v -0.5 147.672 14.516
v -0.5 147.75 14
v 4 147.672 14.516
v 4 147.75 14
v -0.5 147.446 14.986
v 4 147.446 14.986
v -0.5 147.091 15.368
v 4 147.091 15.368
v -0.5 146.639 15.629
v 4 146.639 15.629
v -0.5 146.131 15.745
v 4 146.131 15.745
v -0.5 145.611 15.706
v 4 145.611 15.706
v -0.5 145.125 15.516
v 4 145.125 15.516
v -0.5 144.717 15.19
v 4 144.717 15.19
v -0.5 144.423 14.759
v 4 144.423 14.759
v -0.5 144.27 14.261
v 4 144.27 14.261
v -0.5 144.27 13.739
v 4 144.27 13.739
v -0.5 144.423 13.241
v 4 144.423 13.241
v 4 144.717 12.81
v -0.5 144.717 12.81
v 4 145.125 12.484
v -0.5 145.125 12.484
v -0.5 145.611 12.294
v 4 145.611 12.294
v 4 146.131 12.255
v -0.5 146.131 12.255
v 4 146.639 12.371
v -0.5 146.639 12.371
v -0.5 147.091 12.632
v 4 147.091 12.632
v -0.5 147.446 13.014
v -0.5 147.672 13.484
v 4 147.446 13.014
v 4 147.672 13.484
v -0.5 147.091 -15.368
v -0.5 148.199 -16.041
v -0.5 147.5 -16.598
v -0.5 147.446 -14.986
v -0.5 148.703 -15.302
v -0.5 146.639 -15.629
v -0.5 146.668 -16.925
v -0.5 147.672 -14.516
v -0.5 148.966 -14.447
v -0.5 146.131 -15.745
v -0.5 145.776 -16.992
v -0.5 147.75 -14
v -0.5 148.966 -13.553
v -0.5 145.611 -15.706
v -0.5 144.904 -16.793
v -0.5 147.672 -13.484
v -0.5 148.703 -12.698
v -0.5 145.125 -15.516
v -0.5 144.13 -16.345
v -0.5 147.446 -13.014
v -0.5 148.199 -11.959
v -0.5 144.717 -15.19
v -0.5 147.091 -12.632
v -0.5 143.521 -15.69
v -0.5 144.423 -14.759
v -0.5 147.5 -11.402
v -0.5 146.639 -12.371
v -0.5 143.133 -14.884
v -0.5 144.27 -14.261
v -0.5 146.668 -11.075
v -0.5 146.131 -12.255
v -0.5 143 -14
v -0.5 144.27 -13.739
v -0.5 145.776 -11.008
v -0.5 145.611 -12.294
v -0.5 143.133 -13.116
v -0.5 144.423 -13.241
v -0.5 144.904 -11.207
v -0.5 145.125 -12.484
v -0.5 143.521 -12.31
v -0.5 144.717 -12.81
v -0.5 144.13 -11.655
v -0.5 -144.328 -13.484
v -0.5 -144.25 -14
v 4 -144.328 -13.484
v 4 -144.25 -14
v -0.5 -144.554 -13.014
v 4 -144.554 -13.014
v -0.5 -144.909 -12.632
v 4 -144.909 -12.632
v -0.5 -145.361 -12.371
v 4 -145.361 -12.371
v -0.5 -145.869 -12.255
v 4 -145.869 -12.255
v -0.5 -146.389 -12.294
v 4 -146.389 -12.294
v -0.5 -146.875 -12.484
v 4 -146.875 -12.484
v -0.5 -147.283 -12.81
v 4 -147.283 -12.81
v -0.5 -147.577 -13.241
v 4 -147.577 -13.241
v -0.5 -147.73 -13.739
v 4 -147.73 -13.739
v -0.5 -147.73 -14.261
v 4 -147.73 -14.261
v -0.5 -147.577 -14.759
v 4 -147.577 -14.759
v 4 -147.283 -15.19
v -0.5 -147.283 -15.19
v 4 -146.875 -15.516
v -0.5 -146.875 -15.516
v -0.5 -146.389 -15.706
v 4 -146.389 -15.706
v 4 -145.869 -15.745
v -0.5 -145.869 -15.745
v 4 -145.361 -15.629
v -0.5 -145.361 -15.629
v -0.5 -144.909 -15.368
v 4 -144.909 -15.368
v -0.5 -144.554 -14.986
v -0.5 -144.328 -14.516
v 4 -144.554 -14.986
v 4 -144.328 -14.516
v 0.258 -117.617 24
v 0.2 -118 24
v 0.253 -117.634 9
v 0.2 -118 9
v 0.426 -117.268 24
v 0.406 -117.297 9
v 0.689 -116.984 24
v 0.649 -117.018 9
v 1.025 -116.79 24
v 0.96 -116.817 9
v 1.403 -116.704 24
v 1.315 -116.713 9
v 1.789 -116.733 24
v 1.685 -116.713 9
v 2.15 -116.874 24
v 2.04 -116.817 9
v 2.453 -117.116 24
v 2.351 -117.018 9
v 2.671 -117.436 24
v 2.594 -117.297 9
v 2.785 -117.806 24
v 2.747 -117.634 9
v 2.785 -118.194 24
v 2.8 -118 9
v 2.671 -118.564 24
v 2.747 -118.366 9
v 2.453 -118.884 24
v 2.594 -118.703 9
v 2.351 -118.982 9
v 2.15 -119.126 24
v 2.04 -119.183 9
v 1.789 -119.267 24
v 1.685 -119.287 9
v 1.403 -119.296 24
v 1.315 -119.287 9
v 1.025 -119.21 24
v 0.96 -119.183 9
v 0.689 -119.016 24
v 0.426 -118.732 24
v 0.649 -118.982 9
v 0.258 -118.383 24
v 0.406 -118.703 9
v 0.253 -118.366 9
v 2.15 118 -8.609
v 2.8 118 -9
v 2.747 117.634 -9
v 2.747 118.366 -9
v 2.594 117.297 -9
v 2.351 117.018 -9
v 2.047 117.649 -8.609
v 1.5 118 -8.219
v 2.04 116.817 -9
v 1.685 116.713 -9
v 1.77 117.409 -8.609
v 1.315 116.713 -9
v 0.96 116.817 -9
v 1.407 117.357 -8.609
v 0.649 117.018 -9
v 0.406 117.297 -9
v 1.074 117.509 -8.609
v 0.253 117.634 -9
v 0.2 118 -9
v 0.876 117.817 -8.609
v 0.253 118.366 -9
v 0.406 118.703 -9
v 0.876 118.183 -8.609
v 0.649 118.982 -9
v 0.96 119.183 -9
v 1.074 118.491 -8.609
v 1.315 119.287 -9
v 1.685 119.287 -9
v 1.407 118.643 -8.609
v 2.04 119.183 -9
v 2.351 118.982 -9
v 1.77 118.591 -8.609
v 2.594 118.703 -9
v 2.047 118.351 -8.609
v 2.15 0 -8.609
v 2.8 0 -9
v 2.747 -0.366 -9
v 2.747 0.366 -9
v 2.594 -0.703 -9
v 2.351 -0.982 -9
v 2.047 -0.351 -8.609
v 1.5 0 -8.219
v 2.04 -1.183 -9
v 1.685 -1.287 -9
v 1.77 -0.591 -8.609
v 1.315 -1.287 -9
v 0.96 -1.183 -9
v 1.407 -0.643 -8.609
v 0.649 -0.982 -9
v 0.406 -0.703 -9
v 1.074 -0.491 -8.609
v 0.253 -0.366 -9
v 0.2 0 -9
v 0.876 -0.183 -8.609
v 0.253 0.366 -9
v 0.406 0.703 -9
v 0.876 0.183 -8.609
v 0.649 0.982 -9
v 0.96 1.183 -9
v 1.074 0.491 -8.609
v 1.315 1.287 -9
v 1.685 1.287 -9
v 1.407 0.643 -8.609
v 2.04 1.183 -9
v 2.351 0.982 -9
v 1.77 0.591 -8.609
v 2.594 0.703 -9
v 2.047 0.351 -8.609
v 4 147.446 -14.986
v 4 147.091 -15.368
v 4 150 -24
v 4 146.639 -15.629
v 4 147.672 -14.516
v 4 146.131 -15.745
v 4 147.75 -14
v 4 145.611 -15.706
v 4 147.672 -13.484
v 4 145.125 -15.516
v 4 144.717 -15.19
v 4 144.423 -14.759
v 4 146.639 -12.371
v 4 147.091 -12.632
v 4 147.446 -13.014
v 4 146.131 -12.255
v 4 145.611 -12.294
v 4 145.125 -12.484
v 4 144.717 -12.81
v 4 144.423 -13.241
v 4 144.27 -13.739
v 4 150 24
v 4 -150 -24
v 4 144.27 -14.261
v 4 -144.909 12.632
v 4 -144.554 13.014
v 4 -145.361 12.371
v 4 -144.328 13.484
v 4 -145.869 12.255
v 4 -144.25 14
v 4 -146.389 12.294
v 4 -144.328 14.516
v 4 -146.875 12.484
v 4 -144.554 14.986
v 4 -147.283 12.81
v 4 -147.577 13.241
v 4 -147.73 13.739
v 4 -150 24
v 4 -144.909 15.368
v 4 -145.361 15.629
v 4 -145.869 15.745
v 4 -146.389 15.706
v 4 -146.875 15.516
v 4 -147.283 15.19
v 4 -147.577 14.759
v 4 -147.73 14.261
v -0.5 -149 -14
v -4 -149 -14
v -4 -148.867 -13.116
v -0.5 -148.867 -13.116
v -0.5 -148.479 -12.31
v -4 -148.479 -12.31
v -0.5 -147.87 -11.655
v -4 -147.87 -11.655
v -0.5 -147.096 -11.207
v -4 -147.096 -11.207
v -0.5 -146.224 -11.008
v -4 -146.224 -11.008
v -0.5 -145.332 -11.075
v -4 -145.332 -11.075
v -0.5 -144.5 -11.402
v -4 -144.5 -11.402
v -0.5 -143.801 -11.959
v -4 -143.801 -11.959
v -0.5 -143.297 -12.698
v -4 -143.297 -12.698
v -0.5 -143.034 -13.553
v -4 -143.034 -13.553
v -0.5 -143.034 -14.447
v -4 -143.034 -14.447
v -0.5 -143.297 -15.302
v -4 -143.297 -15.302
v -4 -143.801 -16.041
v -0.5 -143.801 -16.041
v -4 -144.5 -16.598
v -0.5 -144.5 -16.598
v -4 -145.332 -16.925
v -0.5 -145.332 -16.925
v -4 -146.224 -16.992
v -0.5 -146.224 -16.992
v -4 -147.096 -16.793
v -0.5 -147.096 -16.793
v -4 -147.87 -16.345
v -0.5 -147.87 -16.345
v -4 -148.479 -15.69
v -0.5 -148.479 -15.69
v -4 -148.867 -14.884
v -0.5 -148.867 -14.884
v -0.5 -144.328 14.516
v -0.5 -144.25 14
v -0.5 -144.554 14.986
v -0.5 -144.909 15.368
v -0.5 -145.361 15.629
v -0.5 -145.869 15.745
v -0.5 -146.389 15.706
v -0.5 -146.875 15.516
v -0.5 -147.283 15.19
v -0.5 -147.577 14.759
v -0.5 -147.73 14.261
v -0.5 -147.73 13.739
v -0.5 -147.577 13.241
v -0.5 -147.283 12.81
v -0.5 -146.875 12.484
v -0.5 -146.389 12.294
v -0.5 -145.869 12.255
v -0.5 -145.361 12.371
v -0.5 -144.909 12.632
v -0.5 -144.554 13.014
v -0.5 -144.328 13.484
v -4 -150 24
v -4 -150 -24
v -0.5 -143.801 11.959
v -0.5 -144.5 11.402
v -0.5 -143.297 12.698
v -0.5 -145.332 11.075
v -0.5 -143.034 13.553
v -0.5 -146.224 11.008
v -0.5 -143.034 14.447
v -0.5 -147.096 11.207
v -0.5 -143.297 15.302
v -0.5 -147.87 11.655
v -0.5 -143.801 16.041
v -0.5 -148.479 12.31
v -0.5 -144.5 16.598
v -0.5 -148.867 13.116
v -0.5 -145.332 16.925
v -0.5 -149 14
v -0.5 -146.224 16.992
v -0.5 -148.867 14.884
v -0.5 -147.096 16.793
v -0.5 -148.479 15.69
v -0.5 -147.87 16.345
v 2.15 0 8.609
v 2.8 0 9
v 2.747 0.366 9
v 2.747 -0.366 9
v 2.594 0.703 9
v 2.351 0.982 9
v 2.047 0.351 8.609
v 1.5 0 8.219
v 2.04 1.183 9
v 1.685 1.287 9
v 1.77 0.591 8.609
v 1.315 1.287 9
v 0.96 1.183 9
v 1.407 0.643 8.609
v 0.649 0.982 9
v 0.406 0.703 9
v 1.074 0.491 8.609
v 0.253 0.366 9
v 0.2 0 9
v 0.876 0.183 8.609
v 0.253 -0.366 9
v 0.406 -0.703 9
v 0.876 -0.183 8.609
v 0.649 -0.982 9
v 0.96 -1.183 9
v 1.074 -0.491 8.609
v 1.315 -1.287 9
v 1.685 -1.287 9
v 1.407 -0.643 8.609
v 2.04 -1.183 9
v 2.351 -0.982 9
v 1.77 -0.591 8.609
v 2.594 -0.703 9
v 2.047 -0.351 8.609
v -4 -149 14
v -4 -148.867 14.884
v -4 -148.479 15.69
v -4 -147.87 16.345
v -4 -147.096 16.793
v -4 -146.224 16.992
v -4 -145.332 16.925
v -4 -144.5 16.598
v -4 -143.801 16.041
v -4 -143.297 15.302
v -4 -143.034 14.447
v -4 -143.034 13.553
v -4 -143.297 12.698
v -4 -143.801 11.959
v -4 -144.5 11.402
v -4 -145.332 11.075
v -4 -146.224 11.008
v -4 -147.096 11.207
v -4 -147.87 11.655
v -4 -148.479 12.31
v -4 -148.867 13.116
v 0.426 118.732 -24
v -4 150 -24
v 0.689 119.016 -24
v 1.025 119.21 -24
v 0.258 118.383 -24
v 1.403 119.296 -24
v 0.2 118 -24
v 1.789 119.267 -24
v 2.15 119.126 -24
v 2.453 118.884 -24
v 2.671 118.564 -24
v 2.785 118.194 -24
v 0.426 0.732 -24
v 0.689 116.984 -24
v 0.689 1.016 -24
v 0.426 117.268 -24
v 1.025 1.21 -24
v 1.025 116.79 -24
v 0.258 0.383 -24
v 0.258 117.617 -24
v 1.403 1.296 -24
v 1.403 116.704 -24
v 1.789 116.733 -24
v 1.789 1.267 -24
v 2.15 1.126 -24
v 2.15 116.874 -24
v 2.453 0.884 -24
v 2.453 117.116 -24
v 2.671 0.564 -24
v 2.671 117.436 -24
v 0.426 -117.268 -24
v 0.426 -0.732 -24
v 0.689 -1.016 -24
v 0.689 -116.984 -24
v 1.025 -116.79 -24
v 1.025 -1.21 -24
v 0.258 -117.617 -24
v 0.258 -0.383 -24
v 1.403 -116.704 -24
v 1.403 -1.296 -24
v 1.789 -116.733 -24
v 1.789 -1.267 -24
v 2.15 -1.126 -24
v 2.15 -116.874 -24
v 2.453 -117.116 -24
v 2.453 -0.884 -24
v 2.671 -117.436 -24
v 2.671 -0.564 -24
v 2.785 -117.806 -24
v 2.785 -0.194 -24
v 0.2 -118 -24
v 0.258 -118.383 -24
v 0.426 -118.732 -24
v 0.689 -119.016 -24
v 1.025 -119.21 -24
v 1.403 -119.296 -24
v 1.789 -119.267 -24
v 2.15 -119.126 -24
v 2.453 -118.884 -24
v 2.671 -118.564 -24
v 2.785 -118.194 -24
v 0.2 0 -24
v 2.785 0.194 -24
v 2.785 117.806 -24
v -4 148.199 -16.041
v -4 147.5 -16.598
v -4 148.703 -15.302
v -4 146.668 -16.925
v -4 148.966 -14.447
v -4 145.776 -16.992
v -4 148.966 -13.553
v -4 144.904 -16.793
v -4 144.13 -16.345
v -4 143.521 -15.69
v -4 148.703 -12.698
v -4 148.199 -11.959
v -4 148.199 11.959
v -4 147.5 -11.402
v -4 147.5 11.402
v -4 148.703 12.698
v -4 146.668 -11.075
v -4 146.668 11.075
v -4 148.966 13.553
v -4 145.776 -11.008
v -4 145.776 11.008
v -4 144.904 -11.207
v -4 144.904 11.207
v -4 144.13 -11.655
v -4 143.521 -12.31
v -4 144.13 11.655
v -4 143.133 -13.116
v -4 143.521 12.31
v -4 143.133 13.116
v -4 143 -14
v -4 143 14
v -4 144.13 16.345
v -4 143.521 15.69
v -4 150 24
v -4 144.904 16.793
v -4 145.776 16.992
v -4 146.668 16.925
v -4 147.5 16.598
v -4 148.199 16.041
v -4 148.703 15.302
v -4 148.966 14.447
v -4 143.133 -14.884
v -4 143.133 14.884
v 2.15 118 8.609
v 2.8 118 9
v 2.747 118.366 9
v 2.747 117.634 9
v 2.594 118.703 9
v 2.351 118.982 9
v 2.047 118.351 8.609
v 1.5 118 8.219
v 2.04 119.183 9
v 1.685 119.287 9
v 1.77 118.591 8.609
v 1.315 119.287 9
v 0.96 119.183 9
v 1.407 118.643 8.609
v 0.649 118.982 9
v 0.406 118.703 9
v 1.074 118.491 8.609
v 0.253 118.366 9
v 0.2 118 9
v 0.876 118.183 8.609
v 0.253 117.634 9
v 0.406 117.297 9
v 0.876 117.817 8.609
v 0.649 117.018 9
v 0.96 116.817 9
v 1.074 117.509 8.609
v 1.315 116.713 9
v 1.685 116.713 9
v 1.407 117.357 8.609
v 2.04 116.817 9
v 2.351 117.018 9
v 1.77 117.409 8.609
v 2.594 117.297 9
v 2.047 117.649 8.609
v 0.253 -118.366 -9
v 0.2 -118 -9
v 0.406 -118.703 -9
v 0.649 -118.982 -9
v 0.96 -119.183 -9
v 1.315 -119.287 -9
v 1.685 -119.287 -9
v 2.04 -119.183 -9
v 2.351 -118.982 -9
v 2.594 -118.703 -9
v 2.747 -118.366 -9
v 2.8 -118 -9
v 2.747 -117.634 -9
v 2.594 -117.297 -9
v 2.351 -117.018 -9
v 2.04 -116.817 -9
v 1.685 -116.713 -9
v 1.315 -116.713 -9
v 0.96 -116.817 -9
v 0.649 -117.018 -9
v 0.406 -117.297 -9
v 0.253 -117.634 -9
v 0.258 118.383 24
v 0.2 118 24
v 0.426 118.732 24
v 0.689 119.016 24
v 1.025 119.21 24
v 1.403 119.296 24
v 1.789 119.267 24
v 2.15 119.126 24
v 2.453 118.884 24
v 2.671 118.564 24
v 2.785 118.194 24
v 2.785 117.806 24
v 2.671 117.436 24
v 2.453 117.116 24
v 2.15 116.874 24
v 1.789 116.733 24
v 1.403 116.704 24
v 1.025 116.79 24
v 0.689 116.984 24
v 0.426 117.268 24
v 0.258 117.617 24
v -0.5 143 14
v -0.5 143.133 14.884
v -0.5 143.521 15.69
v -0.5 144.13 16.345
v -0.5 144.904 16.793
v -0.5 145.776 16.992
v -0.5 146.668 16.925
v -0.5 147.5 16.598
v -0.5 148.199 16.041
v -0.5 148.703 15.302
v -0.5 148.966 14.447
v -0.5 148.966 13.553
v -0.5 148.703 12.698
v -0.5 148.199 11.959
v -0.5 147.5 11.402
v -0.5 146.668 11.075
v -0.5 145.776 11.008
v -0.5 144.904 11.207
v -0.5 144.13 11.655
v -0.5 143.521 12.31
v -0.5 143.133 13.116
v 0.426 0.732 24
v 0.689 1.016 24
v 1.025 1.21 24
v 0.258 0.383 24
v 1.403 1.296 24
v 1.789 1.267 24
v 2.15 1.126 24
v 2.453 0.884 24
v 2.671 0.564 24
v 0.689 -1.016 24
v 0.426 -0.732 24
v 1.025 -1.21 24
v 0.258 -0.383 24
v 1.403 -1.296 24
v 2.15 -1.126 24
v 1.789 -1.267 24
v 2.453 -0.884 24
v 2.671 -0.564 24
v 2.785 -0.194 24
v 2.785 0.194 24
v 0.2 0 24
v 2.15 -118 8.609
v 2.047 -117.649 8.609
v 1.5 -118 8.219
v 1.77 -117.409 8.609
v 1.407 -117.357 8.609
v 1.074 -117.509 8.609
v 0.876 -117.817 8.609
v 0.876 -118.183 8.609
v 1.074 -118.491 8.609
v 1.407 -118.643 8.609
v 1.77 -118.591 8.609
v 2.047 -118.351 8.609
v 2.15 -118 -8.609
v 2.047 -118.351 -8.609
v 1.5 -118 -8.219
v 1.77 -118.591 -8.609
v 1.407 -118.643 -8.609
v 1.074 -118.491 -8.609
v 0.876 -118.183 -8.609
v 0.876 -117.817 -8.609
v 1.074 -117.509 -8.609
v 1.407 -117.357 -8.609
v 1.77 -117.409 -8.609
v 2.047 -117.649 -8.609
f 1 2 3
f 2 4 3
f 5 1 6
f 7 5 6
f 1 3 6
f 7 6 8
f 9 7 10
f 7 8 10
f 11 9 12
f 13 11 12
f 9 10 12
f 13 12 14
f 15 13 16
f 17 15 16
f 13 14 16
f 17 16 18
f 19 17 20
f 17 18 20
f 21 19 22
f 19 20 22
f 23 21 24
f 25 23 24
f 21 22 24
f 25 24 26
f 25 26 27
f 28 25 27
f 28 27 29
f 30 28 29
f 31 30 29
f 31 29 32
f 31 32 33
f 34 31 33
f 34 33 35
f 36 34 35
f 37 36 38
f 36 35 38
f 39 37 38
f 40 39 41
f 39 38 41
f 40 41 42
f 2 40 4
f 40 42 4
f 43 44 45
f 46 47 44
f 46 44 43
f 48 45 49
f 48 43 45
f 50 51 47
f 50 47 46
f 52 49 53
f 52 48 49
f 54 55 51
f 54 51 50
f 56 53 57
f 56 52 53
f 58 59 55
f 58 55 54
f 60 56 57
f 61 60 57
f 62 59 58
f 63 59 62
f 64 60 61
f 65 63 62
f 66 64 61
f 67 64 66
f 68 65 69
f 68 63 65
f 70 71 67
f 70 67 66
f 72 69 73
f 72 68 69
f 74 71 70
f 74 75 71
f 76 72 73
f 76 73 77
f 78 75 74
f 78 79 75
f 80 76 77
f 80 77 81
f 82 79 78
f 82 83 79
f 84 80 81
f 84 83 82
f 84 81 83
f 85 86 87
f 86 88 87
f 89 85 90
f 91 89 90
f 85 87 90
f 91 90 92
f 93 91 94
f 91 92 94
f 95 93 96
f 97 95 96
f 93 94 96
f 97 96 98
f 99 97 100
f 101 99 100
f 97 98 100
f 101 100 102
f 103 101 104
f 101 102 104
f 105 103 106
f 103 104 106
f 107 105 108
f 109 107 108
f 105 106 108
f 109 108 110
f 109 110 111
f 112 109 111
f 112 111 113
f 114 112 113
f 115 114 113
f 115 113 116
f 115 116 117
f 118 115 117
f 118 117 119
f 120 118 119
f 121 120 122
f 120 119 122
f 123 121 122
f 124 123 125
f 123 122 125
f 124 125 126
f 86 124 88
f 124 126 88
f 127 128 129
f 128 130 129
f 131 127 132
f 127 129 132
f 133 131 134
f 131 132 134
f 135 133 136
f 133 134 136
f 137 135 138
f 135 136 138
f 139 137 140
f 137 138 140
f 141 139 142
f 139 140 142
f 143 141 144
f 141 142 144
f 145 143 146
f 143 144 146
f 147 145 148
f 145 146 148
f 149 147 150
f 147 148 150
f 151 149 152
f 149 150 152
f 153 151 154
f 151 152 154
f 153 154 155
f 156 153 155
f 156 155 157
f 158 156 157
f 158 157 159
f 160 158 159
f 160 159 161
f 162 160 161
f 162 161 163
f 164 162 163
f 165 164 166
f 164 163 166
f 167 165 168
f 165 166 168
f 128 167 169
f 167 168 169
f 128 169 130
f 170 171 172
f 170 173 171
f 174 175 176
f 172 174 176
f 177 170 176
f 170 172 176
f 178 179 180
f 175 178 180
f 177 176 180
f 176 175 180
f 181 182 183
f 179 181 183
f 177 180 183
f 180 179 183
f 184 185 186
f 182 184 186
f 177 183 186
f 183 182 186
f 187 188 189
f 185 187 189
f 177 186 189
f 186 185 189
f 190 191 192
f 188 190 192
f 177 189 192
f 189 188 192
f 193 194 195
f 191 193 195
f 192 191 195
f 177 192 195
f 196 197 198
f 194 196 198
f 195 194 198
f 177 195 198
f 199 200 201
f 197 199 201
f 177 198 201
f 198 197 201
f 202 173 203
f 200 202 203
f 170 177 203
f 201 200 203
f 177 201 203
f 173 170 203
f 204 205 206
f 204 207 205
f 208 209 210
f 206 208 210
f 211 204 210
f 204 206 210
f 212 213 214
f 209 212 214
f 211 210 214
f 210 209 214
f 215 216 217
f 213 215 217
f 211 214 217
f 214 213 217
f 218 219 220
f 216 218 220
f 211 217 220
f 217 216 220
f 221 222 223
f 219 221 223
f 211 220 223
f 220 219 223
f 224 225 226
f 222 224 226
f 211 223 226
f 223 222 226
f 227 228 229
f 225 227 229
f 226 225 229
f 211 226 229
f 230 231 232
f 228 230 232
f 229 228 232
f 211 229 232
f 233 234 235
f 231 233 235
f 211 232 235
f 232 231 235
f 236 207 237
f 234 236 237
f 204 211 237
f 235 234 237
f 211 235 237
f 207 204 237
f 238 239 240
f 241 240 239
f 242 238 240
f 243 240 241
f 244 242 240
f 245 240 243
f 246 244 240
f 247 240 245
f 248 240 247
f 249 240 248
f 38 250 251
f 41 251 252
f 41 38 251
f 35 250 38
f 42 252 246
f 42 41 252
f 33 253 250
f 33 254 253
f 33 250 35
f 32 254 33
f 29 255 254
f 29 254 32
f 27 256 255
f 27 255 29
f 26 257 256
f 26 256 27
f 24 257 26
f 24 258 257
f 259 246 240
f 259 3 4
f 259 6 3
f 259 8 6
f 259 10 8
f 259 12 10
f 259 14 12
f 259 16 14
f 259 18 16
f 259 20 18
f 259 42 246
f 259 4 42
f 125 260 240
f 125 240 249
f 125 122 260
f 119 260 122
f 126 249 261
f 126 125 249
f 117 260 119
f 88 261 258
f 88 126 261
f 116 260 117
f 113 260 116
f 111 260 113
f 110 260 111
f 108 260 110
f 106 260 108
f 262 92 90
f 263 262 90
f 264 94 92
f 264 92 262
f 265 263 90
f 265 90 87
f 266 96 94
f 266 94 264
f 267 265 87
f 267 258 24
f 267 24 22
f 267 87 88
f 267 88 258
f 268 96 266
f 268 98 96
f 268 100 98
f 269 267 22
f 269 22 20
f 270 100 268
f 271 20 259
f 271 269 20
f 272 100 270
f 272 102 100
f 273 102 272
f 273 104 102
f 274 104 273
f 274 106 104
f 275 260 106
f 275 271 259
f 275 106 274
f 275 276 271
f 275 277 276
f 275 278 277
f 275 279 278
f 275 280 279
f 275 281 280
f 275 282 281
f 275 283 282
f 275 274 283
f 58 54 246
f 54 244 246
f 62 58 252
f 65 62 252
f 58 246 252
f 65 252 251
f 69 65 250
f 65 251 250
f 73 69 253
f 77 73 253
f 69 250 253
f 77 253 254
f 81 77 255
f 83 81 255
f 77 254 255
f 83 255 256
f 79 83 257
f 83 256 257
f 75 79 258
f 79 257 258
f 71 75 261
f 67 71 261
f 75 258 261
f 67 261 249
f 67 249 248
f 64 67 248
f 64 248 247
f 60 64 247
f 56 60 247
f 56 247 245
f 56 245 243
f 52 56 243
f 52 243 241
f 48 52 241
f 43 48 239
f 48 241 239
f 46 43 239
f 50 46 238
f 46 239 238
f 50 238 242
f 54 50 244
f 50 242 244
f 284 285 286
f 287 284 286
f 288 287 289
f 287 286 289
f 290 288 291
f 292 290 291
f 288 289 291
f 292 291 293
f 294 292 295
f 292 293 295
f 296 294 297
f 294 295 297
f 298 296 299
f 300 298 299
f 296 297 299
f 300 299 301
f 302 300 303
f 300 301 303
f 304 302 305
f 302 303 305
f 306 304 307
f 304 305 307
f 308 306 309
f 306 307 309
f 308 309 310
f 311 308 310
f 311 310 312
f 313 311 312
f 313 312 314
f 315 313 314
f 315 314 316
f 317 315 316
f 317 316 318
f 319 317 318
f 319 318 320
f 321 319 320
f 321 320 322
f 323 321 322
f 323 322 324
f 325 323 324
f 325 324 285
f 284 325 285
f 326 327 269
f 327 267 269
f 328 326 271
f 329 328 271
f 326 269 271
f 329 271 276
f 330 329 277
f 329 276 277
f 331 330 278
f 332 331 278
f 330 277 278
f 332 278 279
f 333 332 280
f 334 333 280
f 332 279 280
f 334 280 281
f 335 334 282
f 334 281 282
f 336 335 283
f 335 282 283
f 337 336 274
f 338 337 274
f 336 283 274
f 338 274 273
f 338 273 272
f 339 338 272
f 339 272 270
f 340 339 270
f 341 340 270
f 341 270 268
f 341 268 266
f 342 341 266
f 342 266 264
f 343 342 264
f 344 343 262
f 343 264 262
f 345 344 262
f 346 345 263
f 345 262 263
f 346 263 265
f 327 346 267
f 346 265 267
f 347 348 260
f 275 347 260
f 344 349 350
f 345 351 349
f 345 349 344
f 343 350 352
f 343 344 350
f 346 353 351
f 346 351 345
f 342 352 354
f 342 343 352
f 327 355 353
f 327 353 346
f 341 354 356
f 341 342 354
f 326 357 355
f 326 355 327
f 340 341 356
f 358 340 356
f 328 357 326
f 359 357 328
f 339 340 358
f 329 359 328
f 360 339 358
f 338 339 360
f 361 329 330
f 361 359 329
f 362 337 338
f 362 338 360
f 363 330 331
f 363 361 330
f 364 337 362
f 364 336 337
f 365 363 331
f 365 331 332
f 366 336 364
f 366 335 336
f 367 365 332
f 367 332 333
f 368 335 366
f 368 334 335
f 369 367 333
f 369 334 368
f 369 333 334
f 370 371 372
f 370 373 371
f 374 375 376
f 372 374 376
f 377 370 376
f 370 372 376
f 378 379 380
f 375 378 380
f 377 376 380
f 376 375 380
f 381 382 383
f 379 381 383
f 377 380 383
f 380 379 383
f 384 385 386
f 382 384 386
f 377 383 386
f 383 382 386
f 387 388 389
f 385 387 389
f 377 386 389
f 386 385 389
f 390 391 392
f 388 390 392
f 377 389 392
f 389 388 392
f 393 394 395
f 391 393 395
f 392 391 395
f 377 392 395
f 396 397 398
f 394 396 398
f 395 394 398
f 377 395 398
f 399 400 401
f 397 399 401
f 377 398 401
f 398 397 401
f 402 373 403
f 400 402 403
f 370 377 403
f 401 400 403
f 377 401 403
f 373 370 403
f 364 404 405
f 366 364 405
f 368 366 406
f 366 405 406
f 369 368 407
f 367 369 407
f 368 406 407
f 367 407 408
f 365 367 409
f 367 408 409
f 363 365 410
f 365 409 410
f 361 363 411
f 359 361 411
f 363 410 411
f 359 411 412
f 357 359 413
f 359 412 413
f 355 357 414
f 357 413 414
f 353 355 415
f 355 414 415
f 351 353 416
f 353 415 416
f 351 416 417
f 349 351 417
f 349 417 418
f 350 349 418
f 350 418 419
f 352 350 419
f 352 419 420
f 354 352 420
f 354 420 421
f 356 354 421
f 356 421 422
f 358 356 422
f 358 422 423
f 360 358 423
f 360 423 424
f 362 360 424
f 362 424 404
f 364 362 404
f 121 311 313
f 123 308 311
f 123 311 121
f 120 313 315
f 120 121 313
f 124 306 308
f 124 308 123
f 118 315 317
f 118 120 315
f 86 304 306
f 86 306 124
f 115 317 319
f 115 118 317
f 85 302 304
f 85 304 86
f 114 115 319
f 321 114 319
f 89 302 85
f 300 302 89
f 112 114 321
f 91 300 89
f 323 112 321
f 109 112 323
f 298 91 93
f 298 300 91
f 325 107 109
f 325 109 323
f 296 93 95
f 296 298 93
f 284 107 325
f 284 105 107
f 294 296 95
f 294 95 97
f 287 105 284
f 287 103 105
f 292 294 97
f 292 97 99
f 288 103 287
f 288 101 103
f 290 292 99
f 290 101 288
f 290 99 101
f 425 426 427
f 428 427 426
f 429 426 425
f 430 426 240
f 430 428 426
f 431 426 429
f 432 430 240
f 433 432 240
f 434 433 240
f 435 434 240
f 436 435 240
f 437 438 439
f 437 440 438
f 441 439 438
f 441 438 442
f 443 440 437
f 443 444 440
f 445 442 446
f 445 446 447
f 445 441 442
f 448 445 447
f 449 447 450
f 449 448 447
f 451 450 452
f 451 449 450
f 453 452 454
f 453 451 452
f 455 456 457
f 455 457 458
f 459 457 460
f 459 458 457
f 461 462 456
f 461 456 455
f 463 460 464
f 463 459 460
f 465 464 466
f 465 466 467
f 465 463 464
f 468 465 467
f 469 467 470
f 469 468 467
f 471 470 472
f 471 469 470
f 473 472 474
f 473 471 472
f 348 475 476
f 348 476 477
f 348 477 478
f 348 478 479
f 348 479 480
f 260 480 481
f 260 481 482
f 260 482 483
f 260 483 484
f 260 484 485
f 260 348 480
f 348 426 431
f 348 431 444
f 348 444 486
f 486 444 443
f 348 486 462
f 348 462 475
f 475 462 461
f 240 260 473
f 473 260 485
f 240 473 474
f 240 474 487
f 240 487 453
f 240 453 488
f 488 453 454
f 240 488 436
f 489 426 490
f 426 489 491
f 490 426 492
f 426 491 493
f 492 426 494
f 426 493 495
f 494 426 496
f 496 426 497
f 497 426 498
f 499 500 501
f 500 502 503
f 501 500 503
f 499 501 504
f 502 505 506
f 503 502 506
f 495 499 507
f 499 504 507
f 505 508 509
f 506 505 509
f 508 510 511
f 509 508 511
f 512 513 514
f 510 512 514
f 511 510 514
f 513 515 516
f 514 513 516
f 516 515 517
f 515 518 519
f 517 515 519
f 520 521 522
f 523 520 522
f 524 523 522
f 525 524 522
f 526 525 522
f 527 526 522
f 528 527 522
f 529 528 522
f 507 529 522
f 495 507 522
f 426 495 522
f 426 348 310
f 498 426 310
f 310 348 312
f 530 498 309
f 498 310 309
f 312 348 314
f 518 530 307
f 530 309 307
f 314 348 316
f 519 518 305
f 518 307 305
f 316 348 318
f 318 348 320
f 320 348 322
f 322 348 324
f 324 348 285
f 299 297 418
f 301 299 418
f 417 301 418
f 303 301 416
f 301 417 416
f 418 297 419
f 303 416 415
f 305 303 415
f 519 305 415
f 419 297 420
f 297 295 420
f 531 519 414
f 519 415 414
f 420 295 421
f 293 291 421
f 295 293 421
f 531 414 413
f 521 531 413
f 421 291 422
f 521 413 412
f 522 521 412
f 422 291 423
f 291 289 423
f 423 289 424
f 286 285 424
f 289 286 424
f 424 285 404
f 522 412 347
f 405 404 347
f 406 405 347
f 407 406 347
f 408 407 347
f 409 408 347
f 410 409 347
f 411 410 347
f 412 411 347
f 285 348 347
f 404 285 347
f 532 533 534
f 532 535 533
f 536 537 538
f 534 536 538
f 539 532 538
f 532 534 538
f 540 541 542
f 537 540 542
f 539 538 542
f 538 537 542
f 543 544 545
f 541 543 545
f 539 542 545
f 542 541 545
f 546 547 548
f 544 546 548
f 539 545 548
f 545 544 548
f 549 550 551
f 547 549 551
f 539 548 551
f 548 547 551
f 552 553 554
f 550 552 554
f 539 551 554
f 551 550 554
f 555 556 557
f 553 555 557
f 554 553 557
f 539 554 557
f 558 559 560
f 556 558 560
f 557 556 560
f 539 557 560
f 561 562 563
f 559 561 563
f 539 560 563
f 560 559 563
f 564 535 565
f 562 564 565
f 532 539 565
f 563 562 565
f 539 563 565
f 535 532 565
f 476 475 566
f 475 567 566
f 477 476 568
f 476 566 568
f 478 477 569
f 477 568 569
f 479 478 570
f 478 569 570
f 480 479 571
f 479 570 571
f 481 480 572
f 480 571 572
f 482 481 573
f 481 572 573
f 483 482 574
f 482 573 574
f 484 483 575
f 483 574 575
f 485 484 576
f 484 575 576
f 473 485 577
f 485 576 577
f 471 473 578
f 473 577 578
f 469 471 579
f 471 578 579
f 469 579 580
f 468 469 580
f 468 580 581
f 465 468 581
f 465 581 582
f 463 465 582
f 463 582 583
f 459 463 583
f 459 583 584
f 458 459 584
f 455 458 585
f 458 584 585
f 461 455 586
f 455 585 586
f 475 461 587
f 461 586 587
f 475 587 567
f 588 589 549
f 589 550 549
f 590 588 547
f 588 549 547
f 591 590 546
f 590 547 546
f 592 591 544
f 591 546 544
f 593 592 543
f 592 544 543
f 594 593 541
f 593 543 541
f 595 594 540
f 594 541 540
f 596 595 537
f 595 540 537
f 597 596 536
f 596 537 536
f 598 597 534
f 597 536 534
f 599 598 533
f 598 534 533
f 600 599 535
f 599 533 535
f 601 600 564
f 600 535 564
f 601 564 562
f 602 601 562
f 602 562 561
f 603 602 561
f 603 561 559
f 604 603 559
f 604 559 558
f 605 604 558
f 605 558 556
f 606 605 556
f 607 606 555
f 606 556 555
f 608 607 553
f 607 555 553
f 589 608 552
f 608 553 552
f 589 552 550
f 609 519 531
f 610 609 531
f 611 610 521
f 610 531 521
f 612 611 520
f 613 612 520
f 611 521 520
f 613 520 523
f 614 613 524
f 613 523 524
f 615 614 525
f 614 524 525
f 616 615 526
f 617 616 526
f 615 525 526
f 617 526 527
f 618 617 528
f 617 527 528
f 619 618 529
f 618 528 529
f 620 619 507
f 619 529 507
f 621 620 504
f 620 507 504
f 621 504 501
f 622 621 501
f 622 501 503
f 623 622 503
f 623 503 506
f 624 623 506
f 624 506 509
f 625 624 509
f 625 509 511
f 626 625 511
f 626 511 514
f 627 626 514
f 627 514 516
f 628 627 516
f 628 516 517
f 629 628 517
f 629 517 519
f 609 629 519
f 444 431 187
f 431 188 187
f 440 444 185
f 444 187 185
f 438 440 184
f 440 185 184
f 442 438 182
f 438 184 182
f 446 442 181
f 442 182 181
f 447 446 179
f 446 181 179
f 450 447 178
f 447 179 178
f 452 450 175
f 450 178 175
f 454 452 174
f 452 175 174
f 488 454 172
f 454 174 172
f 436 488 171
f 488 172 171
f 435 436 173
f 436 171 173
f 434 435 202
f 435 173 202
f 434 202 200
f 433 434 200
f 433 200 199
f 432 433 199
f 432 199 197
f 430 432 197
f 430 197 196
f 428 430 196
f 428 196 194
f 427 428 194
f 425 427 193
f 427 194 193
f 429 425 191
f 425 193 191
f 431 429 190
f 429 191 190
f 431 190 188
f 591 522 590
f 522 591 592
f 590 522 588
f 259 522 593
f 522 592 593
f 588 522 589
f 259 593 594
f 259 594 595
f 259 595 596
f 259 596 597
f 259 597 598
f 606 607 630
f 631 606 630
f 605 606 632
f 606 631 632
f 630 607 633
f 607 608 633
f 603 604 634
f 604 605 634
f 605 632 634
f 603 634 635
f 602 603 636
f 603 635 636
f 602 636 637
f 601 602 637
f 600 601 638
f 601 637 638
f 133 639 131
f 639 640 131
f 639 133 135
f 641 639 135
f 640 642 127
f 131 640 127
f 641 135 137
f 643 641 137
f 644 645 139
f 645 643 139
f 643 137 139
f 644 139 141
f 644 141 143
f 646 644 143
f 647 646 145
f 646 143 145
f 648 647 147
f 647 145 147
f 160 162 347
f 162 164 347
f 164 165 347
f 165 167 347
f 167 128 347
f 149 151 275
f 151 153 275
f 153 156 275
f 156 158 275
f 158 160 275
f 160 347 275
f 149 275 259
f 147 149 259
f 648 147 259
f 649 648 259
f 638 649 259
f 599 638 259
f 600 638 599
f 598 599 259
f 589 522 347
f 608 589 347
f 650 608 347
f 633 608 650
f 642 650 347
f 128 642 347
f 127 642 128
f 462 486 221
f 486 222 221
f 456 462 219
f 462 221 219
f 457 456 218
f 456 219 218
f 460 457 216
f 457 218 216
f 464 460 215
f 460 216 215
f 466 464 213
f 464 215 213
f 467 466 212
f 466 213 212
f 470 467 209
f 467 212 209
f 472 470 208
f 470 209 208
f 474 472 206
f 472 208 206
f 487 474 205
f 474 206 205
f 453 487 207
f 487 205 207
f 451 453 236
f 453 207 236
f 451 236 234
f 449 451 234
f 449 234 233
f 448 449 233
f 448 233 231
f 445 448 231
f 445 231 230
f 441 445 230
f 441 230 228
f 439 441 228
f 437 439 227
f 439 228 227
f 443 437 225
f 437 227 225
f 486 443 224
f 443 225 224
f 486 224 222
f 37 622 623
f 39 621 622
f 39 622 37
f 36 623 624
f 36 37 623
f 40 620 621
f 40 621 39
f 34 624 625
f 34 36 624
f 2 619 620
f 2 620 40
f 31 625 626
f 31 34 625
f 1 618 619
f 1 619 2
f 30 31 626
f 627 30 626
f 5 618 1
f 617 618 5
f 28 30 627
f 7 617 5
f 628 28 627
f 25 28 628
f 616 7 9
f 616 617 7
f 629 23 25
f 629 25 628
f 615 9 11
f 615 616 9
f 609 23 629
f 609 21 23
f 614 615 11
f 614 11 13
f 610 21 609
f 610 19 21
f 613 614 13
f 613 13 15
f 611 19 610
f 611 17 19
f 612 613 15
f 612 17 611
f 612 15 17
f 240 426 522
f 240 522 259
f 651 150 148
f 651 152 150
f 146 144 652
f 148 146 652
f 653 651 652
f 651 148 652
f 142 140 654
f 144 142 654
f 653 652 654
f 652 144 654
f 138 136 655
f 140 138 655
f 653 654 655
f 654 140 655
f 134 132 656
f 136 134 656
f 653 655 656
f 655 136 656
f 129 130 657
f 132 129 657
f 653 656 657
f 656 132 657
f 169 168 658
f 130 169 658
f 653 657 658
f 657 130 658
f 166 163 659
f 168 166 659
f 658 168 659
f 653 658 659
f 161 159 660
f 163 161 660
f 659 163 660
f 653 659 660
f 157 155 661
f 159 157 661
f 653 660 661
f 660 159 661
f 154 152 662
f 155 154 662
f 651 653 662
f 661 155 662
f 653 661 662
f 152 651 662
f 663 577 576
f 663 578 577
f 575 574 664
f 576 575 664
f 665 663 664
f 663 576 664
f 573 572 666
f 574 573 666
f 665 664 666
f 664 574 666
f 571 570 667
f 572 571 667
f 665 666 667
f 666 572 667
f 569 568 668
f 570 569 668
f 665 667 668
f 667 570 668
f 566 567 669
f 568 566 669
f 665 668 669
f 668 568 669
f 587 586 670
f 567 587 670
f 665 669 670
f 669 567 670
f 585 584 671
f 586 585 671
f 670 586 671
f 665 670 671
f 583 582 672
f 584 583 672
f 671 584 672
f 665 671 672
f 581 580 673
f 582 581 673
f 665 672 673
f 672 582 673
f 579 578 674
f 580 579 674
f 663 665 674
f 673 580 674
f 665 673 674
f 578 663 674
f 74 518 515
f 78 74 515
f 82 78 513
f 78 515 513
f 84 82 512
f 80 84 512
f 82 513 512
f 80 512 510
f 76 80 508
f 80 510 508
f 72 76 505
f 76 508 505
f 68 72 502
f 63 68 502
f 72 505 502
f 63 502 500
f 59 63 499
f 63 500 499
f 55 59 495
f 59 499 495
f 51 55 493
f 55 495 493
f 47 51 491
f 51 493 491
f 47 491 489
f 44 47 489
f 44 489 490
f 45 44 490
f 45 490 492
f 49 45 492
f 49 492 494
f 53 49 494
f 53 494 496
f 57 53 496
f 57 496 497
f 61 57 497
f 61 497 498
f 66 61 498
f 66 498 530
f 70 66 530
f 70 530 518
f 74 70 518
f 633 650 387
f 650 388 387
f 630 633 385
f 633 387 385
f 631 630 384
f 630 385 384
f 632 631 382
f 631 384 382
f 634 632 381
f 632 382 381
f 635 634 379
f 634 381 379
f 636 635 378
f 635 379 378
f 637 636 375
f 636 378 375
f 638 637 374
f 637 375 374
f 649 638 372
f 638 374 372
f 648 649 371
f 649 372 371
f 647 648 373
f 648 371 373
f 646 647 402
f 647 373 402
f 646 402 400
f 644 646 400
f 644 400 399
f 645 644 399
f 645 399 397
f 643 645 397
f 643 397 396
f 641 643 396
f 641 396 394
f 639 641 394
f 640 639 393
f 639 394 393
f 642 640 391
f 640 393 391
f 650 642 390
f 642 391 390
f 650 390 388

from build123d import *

# Parameters (mm, degrees)
F0_W           = 8
F0_H           = 48
F1_DEPTH       = 150
F4_D           = 2.6
F4_DEPTH       = 15
F4_TIP         = 0.7811188047
F4_ON_F2_D     = 2.6
F4_ON_F2_DEPTH = 15
F4_ON_F2_TIP   = 0.7811188047
F6_D           = 3.5
F6_CBORE_D     = 6
F6_CBORE_DEPTH = 3.5


with BuildPart() as f1:
    # F0 (on Front) → F1 (new body, symmetric)
    with BuildSketch(Plane.XZ):
        Rectangle(F0_W, F0_H)
    extrude(amount=F1_DEPTH, both=True)

    # F4
    with Locations(Plane(origin=(0, 0, -24), x_dir=(1, 0, 0), z_dir=(0, 0, -1))):
        with Locations((1.5, -118), (1.5, 0), (1.5, 118)):
            Hole(F4_D / 2, depth=F4_DEPTH)
            with Locations((0, 0, -(F4_DEPTH + F4_TIP / 2))):  # 118° drill point
                Cone(0, F4_D / 2, F4_TIP, mode=Mode.SUBTRACT)

    # F4 on F2
    with Locations(Plane.XY.offset(24)):
        with Locations((1.5, -118), (1.5, 0), (1.5, 118)):
            Hole(F4_ON_F2_D / 2, depth=F4_ON_F2_DEPTH)
            with Locations((0, 0, -(F4_ON_F2_DEPTH + F4_ON_F2_TIP / 2))):  # 118° drill point
                Cone(0, F4_ON_F2_D / 2, F4_ON_F2_TIP, mode=Mode.SUBTRACT)

    # F6 (through all)
    with Locations(Plane(origin=(-4, 0, 0), x_dir=(0, -1, 0), z_dir=(-1, 0, 0))):
        with Locations((146, 14), (146, -14), (-146, -14), (-146, 14)):
            CounterBoreHole(F6_D / 2, F6_CBORE_D / 2, F6_CBORE_DEPTH)


solid = f1.part
